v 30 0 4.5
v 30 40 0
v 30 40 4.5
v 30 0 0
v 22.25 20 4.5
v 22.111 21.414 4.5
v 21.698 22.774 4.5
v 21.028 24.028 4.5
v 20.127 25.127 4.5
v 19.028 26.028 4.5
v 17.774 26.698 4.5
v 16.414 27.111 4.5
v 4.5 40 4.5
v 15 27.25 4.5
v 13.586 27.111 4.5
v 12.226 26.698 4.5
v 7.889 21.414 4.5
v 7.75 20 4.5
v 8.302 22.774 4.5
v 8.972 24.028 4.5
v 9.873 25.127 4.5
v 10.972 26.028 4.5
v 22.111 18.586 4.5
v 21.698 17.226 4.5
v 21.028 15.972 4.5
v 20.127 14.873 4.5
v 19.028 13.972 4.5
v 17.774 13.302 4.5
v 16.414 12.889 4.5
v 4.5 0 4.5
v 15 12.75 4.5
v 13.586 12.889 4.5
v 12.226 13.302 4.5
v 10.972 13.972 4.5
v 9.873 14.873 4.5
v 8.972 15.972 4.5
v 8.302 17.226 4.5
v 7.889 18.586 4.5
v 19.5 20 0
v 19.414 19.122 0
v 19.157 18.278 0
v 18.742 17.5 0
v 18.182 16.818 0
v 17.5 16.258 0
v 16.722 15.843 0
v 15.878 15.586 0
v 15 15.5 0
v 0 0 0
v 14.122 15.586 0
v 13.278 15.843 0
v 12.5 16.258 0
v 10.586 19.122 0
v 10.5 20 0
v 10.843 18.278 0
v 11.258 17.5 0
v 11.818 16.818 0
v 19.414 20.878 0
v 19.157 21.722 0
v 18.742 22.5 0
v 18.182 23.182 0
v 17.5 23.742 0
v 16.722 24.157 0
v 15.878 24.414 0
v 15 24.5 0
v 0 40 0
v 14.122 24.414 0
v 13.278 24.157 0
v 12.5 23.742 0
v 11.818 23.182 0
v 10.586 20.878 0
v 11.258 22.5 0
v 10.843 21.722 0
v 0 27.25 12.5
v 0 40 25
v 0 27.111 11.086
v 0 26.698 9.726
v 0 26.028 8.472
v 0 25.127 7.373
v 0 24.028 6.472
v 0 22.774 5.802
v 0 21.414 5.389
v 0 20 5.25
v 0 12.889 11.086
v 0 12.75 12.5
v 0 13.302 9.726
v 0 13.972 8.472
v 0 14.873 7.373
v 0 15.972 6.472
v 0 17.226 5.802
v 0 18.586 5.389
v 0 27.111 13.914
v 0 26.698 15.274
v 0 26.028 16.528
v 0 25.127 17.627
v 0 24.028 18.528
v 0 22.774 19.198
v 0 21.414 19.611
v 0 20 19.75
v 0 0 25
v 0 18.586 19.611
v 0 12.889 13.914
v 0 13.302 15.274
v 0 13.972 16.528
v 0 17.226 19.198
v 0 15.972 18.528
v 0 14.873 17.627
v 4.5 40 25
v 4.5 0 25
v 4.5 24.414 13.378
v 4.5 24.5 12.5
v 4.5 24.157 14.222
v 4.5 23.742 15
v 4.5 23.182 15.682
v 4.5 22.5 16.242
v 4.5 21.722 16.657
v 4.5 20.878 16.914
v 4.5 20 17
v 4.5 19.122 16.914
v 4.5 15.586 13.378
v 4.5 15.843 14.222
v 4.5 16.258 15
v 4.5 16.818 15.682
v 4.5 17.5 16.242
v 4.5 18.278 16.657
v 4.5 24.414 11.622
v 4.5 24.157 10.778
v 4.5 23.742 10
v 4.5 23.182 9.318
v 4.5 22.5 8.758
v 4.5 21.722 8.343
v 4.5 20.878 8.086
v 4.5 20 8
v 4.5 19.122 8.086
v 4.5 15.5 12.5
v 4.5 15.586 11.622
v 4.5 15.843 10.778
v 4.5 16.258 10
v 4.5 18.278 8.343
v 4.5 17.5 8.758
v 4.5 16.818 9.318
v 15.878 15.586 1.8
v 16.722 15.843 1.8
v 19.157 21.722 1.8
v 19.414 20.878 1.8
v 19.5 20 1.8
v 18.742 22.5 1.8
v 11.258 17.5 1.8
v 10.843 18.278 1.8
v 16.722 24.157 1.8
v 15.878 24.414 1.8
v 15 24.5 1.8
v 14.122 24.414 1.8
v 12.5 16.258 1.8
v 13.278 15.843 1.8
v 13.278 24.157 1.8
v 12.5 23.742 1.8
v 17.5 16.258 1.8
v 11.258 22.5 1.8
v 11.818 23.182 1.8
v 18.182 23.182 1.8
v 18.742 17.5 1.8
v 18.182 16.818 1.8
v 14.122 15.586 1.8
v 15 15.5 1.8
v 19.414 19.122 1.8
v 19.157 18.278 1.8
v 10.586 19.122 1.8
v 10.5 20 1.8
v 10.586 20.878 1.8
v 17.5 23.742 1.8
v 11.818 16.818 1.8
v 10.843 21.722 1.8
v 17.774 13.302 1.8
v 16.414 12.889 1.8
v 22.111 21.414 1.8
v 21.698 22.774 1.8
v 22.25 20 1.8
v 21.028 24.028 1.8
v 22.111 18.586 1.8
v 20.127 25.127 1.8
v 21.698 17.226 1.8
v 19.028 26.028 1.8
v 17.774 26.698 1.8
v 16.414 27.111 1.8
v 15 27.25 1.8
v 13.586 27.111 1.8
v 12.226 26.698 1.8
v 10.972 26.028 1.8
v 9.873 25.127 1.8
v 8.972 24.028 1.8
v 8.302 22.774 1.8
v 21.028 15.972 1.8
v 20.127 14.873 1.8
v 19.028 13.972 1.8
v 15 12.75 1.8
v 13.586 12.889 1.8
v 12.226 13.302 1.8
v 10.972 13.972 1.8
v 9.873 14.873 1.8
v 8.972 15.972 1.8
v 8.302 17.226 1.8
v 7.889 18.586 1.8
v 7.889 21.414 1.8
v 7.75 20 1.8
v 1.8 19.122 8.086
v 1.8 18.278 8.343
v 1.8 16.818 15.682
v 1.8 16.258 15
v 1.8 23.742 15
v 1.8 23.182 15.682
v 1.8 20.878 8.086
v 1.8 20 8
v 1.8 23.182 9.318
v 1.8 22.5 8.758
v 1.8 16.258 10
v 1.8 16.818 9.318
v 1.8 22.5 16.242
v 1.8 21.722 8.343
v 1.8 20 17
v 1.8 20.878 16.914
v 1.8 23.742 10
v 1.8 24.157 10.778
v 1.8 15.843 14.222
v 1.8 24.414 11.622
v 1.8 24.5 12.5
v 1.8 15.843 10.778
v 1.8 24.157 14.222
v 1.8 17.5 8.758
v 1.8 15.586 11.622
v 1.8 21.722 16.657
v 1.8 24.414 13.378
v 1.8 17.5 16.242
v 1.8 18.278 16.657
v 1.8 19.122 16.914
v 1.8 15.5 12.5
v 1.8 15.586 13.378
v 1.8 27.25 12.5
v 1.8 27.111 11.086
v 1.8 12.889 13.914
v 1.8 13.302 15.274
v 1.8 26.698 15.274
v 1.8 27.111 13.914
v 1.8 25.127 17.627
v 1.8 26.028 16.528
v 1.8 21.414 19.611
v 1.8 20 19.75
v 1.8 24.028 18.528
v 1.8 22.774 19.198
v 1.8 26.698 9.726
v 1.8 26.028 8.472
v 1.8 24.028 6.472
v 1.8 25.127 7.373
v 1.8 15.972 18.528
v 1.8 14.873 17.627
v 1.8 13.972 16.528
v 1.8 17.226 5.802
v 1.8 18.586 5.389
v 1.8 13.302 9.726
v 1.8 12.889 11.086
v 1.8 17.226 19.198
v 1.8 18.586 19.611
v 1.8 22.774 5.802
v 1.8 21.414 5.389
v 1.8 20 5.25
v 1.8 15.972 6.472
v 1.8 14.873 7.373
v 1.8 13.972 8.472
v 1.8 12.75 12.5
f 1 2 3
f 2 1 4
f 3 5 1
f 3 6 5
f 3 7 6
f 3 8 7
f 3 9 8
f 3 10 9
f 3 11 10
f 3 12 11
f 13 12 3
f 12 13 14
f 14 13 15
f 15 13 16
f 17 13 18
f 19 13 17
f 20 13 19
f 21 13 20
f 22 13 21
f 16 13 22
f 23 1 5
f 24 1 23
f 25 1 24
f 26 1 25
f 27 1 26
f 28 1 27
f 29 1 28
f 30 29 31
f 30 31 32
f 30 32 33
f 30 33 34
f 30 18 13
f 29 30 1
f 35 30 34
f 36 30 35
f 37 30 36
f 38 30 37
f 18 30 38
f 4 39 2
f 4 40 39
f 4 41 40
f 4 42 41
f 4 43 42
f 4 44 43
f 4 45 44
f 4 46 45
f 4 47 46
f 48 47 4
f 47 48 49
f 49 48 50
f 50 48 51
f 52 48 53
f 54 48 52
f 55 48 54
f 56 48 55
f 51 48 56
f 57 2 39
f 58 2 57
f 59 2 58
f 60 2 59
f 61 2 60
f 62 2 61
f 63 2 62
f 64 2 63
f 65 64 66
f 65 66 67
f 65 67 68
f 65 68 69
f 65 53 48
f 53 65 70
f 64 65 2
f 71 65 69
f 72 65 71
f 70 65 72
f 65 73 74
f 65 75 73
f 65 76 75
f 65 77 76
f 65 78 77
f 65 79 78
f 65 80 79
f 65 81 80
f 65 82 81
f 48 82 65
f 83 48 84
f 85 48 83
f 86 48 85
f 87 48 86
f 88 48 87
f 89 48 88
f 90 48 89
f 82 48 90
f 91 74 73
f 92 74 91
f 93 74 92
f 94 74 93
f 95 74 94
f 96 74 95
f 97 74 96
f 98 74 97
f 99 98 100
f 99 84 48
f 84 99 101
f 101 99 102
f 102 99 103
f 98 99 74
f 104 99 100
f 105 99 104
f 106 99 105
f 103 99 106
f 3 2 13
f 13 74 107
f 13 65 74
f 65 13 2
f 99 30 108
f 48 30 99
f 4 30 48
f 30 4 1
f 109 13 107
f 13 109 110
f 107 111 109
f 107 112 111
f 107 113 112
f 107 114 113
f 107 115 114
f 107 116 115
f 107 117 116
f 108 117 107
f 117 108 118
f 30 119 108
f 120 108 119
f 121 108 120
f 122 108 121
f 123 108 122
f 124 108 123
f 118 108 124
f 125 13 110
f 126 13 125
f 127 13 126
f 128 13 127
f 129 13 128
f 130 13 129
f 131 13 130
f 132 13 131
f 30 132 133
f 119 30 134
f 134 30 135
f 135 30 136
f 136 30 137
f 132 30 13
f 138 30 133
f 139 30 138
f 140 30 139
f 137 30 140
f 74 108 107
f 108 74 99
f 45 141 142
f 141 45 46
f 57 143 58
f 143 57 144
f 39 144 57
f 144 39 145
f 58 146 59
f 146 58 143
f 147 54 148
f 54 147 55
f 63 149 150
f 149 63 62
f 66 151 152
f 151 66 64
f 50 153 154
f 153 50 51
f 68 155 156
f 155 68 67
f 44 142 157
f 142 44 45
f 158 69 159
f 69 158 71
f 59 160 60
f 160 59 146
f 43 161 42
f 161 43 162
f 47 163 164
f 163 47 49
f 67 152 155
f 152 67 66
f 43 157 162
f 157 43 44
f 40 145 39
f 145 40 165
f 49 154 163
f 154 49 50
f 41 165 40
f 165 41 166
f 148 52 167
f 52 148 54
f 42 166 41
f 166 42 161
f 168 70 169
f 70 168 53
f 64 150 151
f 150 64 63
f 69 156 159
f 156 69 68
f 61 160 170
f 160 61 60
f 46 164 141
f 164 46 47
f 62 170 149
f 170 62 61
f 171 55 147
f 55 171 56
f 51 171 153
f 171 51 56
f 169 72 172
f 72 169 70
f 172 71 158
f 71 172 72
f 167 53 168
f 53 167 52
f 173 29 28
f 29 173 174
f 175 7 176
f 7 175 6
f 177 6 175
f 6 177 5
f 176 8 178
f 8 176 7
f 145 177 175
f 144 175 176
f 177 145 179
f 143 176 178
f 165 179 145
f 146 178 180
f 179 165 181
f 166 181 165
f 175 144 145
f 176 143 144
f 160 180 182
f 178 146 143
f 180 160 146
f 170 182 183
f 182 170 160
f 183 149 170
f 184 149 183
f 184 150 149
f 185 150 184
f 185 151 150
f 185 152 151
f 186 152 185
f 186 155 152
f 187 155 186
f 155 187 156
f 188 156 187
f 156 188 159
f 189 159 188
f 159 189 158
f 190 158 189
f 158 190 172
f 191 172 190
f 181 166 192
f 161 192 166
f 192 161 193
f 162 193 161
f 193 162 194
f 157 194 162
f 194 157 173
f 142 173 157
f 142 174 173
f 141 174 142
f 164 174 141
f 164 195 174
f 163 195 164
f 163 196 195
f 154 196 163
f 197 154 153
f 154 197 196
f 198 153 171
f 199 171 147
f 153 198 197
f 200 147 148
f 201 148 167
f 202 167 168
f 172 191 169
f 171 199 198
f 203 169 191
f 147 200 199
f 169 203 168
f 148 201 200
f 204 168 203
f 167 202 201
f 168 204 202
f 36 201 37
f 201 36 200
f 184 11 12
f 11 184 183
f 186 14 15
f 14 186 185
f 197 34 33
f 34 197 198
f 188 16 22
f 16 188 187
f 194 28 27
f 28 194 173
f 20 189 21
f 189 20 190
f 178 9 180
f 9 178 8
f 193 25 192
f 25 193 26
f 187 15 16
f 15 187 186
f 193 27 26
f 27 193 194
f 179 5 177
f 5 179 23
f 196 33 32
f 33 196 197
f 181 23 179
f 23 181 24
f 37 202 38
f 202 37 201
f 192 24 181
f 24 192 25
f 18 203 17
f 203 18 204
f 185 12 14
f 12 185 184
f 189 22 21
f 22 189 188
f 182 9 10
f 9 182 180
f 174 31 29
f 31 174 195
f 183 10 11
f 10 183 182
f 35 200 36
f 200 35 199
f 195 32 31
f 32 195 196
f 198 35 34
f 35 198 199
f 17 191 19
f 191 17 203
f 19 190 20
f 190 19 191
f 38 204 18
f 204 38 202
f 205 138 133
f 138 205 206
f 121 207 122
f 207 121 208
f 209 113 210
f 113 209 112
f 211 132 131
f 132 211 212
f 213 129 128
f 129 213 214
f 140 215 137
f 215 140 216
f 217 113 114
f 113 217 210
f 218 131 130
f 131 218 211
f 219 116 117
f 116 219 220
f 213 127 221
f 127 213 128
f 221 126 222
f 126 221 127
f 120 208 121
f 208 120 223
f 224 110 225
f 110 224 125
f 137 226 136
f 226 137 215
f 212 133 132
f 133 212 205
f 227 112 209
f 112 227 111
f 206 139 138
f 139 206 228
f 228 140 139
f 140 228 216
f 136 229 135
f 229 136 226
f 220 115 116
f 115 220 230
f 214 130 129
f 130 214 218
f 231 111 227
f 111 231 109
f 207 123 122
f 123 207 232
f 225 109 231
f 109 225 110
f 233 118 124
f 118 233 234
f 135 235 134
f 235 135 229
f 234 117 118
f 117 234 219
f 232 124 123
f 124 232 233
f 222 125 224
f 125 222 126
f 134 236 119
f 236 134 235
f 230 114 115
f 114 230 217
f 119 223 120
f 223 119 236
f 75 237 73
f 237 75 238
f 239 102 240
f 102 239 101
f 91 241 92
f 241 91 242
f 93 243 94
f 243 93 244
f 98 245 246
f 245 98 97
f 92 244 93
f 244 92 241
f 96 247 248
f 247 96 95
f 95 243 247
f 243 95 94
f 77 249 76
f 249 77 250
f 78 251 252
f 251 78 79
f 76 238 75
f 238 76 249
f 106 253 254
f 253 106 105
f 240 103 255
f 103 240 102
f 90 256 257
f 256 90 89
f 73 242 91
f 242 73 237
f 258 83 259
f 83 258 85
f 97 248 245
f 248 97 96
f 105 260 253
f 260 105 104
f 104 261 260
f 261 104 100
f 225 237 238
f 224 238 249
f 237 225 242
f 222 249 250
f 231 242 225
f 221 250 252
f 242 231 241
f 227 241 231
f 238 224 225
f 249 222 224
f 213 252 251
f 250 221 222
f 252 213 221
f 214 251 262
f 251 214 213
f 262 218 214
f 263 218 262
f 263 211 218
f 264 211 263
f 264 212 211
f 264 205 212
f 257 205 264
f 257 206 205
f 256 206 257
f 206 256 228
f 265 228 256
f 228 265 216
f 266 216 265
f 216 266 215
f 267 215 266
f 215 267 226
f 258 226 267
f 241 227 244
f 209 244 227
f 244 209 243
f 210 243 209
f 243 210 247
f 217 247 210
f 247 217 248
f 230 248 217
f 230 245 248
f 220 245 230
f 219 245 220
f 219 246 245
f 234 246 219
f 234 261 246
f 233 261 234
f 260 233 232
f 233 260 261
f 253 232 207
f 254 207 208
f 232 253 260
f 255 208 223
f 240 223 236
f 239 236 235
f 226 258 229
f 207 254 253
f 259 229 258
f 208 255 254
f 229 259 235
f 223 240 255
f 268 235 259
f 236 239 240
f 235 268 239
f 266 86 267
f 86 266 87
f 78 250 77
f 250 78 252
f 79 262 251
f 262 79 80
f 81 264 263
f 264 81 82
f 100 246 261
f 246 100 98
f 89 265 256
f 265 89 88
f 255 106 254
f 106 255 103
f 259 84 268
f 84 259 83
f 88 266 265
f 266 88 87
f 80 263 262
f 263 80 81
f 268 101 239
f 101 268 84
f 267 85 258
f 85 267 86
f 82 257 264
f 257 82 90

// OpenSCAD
$fn = 32;

// ----------------------------------------------------------------------
// L-bracket: 30 x 40 x 25 mm
// ----------------------------------------------------------------------

// --- parameters (mm) ---
arm_x = 30;               // horizontal leg, X
arm_z = 25;               // vertical leg, Z
width = 40;               // bracket depth, Y
wall = 4.5;               // plate thickness
hole_d = 9;               // clearance for M8
cb_d = 14.5;              // counterbore seat
cb_h = 2.7;               // counterbore depth

module hole_z(px, py) {
  translate([px, py, -0.5]) cylinder(h = wall + 1, d = hole_d);
}
module hole_x(pz, py) {
  translate([-0.5, py, pz]) rotate([0, 90, 0]) cylinder(h = wall + 1, d = hole_d);
}
module cb_z(px, py) {
  translate([px, py, wall - cb_h]) cylinder(h = cb_h + 0.4, d = cb_d);
}
module cb_x(pz, py) {
  translate([wall - cb_h, py, pz]) rotate([0, -90, 0]) cylinder(h = cb_h + 0.4, d = cb_d);
}

difference() {
  union() {
    /* horizontal leg */
    cube([arm_x, width, wall]);
    /* vertical leg, overlapping the corner block */
    cube([wall, width, arm_z]);
  }
  hole_z(15, 20);
  cb_z(15, 20);
  hole_x(12.5, 20);
  cb_x(12.5, 20);
}
